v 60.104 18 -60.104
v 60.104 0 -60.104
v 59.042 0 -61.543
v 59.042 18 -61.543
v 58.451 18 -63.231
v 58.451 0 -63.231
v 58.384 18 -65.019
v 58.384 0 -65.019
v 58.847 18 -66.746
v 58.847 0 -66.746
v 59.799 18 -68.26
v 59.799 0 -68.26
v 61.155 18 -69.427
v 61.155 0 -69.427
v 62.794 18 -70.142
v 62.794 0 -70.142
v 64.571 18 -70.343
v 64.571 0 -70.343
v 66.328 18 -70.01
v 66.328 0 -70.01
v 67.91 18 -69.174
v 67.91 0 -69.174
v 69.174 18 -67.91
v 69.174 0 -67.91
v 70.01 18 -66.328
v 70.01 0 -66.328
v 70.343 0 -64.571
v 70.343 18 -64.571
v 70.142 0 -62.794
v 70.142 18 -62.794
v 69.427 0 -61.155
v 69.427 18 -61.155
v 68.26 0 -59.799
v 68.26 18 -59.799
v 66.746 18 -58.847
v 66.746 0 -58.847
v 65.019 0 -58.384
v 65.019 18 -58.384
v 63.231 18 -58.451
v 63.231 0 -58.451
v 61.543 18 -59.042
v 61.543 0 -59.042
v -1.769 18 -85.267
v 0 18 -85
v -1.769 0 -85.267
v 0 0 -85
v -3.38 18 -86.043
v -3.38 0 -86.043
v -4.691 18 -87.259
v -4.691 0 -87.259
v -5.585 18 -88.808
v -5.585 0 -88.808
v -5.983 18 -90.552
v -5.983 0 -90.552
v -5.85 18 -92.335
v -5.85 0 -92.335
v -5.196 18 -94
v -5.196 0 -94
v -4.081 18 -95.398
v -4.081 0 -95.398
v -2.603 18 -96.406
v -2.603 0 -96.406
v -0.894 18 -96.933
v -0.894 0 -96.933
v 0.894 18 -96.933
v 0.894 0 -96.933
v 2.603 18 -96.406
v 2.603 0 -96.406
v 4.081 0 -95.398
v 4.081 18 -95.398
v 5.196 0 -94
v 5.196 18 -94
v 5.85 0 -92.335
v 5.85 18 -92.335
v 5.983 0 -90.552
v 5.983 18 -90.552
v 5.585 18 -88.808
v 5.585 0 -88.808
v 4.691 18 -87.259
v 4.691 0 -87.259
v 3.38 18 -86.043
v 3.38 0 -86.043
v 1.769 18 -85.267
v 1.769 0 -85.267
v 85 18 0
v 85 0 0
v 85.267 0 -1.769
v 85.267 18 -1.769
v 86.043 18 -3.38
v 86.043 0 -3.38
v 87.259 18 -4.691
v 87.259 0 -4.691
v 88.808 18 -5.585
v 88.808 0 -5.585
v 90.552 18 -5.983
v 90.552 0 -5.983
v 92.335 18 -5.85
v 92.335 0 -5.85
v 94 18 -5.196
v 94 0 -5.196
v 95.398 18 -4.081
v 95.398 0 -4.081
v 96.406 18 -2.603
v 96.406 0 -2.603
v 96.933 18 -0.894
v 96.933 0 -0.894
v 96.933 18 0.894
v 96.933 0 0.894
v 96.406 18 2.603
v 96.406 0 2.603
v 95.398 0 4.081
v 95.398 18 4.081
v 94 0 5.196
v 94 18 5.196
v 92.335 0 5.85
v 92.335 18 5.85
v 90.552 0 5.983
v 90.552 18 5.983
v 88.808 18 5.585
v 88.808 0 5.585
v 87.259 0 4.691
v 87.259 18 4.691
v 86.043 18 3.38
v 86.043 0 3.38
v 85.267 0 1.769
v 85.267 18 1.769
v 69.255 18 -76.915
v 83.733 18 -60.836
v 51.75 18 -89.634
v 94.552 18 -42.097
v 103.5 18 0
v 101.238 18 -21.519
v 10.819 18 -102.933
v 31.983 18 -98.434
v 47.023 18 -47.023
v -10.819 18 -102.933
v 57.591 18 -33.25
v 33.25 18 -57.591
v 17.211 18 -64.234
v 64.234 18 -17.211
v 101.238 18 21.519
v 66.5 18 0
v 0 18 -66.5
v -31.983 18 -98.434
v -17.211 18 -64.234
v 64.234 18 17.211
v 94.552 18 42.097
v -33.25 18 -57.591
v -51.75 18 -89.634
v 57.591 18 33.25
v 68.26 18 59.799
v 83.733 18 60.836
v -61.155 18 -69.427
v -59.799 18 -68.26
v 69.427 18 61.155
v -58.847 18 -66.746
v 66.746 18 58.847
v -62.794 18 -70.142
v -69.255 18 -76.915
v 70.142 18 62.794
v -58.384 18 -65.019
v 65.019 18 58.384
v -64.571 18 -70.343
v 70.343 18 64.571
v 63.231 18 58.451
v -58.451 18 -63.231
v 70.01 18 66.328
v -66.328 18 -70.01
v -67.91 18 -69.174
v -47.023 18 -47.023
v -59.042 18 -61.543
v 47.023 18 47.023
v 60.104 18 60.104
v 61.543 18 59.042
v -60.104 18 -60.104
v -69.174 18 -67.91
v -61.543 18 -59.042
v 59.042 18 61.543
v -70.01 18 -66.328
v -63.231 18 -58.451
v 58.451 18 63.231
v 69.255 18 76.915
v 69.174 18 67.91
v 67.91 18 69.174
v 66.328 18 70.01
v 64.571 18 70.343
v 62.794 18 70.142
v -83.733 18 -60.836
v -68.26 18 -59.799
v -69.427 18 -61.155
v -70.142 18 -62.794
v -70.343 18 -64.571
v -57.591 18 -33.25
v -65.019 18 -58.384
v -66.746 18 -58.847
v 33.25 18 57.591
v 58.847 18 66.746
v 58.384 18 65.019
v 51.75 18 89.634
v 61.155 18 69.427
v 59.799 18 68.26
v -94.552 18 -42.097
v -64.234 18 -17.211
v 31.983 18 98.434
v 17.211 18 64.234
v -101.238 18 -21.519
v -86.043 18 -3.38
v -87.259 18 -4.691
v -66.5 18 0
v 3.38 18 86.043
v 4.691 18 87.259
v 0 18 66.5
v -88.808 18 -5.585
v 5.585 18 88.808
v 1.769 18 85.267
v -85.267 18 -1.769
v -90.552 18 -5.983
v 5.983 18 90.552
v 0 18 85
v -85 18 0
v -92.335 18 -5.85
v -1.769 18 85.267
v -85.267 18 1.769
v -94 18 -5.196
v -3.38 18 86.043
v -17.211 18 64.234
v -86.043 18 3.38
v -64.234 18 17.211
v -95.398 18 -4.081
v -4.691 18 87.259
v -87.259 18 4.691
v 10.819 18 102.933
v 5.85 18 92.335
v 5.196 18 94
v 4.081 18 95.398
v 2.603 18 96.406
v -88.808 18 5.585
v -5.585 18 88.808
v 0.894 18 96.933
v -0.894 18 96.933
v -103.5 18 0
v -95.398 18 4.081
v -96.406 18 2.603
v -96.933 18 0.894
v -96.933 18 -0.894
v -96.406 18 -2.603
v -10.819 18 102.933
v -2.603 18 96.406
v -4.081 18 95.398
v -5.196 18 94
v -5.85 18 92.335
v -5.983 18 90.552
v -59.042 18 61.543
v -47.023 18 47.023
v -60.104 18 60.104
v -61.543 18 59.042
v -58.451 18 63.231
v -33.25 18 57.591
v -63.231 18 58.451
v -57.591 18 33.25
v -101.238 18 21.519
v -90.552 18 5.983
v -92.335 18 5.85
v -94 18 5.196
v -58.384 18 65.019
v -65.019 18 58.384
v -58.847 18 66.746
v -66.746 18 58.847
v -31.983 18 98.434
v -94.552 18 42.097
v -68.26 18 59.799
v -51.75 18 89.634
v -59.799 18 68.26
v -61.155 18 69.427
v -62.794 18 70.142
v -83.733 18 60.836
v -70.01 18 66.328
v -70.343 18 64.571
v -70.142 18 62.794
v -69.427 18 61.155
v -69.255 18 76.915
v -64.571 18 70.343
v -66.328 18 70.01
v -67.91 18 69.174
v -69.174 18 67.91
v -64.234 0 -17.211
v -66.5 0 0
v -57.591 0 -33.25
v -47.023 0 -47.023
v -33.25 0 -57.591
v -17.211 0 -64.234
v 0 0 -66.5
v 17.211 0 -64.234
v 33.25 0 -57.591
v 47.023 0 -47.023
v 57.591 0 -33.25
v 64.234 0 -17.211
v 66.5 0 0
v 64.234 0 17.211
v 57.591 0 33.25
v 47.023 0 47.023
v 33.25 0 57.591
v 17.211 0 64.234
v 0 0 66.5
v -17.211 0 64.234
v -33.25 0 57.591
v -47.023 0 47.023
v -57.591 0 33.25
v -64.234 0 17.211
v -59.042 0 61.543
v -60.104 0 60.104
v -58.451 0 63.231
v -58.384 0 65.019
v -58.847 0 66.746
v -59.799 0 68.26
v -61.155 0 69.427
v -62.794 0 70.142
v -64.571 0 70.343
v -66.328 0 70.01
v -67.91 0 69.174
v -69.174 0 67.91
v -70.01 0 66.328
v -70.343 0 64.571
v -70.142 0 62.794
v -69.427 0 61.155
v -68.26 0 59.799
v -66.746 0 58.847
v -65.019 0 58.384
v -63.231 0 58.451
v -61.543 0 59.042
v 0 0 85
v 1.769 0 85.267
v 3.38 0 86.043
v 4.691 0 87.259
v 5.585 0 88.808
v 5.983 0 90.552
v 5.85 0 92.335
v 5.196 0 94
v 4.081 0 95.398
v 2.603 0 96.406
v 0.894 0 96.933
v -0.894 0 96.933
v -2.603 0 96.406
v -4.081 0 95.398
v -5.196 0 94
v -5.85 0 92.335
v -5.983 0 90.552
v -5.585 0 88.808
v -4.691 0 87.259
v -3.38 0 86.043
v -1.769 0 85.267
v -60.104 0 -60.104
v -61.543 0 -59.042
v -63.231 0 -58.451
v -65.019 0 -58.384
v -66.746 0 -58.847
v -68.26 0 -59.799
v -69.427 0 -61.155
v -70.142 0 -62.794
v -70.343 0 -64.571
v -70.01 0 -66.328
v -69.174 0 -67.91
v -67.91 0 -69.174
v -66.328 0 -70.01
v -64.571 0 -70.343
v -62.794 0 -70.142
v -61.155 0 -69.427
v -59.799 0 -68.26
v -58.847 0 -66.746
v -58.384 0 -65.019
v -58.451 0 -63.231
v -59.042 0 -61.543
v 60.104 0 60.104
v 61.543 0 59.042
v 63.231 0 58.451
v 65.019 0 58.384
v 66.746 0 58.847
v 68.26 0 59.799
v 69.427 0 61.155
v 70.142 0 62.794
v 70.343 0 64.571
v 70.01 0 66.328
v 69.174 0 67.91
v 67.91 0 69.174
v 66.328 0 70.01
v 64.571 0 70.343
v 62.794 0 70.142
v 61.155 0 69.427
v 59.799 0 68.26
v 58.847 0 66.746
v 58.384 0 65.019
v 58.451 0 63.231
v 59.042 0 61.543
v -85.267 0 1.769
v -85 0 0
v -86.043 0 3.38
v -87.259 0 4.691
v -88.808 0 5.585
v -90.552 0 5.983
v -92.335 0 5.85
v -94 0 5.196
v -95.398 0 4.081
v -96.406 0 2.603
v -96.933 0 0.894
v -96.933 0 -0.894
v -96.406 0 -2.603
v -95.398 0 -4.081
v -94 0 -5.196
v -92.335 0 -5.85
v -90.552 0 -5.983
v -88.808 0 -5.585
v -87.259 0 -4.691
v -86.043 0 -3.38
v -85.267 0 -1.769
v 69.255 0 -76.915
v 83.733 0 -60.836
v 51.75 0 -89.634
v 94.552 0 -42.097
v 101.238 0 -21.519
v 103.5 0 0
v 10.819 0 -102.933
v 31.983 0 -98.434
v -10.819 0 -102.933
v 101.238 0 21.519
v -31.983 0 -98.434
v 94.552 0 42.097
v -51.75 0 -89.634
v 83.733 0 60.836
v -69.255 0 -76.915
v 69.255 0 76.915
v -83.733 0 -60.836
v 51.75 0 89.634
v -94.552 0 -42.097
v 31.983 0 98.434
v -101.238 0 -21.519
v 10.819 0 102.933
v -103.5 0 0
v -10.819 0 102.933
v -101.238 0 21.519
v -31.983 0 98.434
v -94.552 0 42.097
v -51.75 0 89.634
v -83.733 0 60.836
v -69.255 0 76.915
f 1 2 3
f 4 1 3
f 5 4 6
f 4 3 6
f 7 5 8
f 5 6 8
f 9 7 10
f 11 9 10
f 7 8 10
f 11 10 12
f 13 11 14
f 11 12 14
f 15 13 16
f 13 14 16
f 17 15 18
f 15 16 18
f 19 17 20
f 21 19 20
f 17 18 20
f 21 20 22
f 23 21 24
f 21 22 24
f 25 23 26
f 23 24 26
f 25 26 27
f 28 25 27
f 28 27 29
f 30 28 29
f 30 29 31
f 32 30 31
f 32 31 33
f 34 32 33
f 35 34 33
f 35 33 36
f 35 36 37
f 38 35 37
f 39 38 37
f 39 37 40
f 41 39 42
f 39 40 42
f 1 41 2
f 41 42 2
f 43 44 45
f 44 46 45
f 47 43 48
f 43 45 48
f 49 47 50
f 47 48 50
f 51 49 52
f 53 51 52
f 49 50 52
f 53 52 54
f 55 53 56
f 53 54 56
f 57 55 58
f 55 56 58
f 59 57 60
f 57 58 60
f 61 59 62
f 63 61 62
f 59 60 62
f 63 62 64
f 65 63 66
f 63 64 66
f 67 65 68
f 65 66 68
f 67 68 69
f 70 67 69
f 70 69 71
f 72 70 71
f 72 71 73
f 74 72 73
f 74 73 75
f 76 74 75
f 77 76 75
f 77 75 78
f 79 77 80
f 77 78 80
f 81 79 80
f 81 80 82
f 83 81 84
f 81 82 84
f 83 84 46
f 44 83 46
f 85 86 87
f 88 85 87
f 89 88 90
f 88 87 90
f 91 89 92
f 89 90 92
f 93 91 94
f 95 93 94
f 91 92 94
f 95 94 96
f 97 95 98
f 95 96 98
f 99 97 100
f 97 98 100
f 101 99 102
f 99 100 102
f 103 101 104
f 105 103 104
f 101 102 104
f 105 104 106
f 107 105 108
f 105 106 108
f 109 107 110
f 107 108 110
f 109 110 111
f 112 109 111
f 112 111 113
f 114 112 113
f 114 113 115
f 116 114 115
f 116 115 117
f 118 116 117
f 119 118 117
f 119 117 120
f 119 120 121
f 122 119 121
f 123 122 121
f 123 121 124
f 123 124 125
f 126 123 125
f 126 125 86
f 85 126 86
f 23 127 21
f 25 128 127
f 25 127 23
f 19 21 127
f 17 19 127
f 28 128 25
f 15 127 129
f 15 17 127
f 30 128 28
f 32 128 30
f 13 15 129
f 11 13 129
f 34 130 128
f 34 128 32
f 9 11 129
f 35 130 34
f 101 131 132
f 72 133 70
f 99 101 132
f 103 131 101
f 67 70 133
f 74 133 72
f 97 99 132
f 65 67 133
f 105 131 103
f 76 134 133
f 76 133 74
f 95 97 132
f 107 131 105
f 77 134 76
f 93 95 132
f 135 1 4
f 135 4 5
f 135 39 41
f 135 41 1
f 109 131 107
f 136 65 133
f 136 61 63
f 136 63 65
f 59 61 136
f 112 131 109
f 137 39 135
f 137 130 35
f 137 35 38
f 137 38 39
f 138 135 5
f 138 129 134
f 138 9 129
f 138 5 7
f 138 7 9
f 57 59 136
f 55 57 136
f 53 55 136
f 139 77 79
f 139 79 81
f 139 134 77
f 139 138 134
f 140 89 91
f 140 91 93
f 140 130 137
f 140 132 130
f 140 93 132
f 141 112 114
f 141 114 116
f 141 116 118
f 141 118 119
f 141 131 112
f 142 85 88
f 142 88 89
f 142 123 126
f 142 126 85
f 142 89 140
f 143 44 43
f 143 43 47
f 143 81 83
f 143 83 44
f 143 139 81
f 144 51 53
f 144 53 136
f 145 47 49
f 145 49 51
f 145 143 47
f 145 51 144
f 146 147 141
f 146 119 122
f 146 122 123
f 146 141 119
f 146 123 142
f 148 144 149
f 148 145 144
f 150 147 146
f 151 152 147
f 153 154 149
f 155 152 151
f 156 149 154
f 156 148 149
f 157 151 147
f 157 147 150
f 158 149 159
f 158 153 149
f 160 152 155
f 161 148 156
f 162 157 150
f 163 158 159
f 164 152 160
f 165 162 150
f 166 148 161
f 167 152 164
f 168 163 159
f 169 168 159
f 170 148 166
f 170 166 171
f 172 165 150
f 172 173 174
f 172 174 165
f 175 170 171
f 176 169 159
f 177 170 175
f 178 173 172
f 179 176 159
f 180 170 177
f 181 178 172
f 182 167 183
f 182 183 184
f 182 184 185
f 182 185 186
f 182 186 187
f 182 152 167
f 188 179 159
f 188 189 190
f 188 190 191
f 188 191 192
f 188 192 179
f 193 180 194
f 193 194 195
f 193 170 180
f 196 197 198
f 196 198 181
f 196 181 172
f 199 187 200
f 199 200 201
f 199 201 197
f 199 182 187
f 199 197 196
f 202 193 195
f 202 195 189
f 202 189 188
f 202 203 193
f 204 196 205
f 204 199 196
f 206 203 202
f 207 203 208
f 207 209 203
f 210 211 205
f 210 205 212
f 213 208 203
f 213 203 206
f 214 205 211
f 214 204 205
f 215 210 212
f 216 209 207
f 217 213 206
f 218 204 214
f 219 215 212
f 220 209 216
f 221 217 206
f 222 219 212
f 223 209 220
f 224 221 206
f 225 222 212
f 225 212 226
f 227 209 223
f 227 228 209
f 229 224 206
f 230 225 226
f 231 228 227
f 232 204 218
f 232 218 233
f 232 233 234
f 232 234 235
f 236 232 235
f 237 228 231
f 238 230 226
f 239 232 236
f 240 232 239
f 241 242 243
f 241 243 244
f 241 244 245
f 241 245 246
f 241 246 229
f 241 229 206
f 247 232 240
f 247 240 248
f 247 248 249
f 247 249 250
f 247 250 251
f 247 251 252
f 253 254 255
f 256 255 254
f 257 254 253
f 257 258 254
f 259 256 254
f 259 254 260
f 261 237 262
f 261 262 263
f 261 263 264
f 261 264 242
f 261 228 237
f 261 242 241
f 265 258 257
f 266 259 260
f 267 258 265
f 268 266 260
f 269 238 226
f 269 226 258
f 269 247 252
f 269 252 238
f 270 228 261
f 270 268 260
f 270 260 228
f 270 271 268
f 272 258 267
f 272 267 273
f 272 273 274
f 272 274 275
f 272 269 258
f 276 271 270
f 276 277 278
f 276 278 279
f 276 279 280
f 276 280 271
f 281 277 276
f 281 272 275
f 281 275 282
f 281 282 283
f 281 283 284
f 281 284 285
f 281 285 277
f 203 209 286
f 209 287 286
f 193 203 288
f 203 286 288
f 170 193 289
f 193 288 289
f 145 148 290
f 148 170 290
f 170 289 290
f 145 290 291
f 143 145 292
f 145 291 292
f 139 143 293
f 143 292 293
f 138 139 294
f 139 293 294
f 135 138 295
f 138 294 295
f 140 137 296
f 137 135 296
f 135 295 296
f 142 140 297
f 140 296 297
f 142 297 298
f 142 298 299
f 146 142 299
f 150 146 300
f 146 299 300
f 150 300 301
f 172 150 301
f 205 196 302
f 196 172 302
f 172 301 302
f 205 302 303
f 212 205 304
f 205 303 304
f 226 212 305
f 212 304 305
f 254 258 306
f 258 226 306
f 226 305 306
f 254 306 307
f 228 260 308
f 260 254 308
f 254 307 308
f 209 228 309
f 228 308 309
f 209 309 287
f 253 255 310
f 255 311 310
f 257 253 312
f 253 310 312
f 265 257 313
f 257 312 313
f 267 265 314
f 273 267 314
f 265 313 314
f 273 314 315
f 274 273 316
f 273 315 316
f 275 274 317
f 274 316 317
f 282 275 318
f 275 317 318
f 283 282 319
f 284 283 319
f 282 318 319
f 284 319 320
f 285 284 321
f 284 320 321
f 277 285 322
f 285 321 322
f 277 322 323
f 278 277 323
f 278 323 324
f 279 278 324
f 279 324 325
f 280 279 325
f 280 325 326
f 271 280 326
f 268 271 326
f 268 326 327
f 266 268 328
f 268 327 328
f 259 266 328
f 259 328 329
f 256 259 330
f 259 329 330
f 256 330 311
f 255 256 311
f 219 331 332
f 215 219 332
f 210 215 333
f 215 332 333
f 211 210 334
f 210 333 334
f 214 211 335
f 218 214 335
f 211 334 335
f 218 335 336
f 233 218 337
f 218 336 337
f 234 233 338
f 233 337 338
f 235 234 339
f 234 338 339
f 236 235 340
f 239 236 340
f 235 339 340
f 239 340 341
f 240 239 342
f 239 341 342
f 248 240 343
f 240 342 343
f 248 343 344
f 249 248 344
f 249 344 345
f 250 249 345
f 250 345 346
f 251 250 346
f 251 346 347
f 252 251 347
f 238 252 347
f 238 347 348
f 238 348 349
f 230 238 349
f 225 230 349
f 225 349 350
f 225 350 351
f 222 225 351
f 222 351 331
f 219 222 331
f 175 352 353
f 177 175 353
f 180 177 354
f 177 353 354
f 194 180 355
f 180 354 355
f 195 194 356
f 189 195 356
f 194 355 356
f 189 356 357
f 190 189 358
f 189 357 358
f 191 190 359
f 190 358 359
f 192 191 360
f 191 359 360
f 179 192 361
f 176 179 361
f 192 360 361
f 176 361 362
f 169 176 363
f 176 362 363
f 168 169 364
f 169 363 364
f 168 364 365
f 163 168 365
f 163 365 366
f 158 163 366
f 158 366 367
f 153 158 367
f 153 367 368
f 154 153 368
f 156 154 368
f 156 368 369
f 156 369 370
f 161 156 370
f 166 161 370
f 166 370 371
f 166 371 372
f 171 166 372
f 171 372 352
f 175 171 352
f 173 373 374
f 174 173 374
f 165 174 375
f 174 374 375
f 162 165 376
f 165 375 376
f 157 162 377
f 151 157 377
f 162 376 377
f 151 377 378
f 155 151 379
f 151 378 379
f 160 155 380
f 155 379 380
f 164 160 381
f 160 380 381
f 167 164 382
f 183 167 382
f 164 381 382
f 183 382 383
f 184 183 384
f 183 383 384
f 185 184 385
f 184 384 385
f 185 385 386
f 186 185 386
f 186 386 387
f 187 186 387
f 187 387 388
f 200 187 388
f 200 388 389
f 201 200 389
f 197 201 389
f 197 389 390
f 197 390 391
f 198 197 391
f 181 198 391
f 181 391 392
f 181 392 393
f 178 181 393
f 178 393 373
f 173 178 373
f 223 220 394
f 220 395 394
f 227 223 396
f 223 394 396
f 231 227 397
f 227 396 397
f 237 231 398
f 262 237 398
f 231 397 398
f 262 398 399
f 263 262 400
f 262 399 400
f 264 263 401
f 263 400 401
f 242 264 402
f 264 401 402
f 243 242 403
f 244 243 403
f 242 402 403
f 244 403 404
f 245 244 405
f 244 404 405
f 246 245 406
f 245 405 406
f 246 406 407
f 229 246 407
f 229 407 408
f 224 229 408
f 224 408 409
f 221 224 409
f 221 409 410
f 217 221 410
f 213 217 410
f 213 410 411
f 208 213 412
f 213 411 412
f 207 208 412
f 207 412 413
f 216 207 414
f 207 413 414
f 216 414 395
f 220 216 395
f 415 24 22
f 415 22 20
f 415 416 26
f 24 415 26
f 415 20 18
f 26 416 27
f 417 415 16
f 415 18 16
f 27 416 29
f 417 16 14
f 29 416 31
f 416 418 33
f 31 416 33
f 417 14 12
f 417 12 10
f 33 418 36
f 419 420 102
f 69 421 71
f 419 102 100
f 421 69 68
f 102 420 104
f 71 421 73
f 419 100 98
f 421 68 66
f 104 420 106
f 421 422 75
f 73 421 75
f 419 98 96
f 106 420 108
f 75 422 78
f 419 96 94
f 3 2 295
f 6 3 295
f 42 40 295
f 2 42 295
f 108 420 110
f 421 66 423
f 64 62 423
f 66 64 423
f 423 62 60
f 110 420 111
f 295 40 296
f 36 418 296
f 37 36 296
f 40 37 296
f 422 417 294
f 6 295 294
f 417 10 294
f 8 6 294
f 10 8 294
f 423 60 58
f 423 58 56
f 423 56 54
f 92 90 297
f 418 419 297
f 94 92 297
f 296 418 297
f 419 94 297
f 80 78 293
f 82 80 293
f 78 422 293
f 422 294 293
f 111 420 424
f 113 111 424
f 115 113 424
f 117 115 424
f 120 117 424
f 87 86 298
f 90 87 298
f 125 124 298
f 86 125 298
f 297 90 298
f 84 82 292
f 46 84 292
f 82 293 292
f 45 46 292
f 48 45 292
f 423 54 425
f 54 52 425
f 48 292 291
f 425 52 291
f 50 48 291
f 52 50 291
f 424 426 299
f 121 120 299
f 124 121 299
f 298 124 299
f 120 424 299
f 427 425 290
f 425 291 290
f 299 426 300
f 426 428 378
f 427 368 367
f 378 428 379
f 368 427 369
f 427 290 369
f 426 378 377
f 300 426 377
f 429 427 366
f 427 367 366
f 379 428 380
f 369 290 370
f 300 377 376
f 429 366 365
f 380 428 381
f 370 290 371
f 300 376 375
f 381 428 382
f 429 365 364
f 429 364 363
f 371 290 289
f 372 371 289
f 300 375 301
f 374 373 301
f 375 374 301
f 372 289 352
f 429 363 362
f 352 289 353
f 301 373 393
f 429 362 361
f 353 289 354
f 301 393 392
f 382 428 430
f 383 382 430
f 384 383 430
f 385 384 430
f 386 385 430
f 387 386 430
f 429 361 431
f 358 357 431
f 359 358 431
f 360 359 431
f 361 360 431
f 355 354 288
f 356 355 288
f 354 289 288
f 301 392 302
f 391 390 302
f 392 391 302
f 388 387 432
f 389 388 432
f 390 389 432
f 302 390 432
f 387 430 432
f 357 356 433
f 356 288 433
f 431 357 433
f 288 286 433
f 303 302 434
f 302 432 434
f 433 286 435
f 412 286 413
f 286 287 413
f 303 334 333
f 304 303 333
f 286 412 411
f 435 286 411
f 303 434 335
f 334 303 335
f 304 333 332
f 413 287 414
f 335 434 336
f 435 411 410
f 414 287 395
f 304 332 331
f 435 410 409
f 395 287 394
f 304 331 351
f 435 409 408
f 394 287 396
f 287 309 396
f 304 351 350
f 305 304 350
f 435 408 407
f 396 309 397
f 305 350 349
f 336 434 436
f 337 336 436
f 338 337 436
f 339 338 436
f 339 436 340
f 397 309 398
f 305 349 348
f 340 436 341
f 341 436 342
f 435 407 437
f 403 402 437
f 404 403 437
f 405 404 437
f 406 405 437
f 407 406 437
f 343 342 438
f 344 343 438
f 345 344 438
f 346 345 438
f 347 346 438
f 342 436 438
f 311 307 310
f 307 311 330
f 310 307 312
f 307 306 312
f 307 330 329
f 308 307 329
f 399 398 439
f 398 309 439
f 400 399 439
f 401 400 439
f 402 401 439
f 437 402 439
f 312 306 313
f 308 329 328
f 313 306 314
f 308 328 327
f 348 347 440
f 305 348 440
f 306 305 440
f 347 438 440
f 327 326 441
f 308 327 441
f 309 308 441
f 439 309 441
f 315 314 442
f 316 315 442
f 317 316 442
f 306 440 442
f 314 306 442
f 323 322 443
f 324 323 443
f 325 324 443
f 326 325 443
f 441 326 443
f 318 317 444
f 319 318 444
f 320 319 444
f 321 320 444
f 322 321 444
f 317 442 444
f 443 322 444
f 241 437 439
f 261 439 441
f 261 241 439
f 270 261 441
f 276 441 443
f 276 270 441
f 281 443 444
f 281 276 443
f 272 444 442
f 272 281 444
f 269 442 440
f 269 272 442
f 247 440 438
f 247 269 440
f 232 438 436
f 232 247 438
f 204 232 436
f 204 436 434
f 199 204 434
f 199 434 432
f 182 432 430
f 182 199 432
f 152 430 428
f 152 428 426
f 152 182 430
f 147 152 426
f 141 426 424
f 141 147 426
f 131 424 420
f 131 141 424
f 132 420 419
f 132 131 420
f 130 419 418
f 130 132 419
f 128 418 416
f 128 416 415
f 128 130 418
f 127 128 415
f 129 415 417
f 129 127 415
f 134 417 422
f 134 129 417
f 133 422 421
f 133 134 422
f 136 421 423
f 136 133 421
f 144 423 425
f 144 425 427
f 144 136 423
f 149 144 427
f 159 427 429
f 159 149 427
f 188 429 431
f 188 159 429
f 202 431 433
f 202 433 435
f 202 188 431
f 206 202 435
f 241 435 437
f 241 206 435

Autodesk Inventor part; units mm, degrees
ref_plane "YZ Plane" through (0, 0, 0) normal (1, 0, 0) x (0, 1, 0)
ref_plane "XZ Plane" through (0, 0, 0) normal (0, 1, 0) x (-1, 0, 0)
ref_plane "XY Plane" through (0, 0, 0) normal (0, 0, 1) x (1, 0, 0)
sketch "Sketch1" plane through (0, 0, 0) normal (0, 0, 1) x (1, 0, 0)
  line L0 (-66.5, 0) -> (-103.5, 0)
  line L1 (-103.5, 0) -> (-103.5, 18)
  line L2 (-103.5, 18) -> (-66.5, 18)
  line L3 (-66.5, 18) -> (-66.5, 0)
  line L4 (0, -3.6) -> (0, 21.6) projected
  point P0 (0, 0)
  dimension "d0" = 66.5
  dimension "d1" = 103.5
  dimension "d2" = 18
revolve "Revolution1" add sketch "Sketch1" angle 360 about axis through (0, -10, 0) along (0, 1, 0)
sketch "Sketch2" plane through (0, 18, 0) normal (0, 1, 0) x (1, 0, 0)
  point P0 (0, 0)
  point P1 (0, 91)
  dimension "d4" = 91
hole "Hole1" at (0, 18, -91) direction (0, -1, 0) diameter 12 end through all
pattern_circular "Circular Pattern1" count 8 over 360 about axis through (0, 9, 0) along (0, 1, 0) of "Hole1"
properties part number "CollarRingBottom" material "Stainless Steel"
